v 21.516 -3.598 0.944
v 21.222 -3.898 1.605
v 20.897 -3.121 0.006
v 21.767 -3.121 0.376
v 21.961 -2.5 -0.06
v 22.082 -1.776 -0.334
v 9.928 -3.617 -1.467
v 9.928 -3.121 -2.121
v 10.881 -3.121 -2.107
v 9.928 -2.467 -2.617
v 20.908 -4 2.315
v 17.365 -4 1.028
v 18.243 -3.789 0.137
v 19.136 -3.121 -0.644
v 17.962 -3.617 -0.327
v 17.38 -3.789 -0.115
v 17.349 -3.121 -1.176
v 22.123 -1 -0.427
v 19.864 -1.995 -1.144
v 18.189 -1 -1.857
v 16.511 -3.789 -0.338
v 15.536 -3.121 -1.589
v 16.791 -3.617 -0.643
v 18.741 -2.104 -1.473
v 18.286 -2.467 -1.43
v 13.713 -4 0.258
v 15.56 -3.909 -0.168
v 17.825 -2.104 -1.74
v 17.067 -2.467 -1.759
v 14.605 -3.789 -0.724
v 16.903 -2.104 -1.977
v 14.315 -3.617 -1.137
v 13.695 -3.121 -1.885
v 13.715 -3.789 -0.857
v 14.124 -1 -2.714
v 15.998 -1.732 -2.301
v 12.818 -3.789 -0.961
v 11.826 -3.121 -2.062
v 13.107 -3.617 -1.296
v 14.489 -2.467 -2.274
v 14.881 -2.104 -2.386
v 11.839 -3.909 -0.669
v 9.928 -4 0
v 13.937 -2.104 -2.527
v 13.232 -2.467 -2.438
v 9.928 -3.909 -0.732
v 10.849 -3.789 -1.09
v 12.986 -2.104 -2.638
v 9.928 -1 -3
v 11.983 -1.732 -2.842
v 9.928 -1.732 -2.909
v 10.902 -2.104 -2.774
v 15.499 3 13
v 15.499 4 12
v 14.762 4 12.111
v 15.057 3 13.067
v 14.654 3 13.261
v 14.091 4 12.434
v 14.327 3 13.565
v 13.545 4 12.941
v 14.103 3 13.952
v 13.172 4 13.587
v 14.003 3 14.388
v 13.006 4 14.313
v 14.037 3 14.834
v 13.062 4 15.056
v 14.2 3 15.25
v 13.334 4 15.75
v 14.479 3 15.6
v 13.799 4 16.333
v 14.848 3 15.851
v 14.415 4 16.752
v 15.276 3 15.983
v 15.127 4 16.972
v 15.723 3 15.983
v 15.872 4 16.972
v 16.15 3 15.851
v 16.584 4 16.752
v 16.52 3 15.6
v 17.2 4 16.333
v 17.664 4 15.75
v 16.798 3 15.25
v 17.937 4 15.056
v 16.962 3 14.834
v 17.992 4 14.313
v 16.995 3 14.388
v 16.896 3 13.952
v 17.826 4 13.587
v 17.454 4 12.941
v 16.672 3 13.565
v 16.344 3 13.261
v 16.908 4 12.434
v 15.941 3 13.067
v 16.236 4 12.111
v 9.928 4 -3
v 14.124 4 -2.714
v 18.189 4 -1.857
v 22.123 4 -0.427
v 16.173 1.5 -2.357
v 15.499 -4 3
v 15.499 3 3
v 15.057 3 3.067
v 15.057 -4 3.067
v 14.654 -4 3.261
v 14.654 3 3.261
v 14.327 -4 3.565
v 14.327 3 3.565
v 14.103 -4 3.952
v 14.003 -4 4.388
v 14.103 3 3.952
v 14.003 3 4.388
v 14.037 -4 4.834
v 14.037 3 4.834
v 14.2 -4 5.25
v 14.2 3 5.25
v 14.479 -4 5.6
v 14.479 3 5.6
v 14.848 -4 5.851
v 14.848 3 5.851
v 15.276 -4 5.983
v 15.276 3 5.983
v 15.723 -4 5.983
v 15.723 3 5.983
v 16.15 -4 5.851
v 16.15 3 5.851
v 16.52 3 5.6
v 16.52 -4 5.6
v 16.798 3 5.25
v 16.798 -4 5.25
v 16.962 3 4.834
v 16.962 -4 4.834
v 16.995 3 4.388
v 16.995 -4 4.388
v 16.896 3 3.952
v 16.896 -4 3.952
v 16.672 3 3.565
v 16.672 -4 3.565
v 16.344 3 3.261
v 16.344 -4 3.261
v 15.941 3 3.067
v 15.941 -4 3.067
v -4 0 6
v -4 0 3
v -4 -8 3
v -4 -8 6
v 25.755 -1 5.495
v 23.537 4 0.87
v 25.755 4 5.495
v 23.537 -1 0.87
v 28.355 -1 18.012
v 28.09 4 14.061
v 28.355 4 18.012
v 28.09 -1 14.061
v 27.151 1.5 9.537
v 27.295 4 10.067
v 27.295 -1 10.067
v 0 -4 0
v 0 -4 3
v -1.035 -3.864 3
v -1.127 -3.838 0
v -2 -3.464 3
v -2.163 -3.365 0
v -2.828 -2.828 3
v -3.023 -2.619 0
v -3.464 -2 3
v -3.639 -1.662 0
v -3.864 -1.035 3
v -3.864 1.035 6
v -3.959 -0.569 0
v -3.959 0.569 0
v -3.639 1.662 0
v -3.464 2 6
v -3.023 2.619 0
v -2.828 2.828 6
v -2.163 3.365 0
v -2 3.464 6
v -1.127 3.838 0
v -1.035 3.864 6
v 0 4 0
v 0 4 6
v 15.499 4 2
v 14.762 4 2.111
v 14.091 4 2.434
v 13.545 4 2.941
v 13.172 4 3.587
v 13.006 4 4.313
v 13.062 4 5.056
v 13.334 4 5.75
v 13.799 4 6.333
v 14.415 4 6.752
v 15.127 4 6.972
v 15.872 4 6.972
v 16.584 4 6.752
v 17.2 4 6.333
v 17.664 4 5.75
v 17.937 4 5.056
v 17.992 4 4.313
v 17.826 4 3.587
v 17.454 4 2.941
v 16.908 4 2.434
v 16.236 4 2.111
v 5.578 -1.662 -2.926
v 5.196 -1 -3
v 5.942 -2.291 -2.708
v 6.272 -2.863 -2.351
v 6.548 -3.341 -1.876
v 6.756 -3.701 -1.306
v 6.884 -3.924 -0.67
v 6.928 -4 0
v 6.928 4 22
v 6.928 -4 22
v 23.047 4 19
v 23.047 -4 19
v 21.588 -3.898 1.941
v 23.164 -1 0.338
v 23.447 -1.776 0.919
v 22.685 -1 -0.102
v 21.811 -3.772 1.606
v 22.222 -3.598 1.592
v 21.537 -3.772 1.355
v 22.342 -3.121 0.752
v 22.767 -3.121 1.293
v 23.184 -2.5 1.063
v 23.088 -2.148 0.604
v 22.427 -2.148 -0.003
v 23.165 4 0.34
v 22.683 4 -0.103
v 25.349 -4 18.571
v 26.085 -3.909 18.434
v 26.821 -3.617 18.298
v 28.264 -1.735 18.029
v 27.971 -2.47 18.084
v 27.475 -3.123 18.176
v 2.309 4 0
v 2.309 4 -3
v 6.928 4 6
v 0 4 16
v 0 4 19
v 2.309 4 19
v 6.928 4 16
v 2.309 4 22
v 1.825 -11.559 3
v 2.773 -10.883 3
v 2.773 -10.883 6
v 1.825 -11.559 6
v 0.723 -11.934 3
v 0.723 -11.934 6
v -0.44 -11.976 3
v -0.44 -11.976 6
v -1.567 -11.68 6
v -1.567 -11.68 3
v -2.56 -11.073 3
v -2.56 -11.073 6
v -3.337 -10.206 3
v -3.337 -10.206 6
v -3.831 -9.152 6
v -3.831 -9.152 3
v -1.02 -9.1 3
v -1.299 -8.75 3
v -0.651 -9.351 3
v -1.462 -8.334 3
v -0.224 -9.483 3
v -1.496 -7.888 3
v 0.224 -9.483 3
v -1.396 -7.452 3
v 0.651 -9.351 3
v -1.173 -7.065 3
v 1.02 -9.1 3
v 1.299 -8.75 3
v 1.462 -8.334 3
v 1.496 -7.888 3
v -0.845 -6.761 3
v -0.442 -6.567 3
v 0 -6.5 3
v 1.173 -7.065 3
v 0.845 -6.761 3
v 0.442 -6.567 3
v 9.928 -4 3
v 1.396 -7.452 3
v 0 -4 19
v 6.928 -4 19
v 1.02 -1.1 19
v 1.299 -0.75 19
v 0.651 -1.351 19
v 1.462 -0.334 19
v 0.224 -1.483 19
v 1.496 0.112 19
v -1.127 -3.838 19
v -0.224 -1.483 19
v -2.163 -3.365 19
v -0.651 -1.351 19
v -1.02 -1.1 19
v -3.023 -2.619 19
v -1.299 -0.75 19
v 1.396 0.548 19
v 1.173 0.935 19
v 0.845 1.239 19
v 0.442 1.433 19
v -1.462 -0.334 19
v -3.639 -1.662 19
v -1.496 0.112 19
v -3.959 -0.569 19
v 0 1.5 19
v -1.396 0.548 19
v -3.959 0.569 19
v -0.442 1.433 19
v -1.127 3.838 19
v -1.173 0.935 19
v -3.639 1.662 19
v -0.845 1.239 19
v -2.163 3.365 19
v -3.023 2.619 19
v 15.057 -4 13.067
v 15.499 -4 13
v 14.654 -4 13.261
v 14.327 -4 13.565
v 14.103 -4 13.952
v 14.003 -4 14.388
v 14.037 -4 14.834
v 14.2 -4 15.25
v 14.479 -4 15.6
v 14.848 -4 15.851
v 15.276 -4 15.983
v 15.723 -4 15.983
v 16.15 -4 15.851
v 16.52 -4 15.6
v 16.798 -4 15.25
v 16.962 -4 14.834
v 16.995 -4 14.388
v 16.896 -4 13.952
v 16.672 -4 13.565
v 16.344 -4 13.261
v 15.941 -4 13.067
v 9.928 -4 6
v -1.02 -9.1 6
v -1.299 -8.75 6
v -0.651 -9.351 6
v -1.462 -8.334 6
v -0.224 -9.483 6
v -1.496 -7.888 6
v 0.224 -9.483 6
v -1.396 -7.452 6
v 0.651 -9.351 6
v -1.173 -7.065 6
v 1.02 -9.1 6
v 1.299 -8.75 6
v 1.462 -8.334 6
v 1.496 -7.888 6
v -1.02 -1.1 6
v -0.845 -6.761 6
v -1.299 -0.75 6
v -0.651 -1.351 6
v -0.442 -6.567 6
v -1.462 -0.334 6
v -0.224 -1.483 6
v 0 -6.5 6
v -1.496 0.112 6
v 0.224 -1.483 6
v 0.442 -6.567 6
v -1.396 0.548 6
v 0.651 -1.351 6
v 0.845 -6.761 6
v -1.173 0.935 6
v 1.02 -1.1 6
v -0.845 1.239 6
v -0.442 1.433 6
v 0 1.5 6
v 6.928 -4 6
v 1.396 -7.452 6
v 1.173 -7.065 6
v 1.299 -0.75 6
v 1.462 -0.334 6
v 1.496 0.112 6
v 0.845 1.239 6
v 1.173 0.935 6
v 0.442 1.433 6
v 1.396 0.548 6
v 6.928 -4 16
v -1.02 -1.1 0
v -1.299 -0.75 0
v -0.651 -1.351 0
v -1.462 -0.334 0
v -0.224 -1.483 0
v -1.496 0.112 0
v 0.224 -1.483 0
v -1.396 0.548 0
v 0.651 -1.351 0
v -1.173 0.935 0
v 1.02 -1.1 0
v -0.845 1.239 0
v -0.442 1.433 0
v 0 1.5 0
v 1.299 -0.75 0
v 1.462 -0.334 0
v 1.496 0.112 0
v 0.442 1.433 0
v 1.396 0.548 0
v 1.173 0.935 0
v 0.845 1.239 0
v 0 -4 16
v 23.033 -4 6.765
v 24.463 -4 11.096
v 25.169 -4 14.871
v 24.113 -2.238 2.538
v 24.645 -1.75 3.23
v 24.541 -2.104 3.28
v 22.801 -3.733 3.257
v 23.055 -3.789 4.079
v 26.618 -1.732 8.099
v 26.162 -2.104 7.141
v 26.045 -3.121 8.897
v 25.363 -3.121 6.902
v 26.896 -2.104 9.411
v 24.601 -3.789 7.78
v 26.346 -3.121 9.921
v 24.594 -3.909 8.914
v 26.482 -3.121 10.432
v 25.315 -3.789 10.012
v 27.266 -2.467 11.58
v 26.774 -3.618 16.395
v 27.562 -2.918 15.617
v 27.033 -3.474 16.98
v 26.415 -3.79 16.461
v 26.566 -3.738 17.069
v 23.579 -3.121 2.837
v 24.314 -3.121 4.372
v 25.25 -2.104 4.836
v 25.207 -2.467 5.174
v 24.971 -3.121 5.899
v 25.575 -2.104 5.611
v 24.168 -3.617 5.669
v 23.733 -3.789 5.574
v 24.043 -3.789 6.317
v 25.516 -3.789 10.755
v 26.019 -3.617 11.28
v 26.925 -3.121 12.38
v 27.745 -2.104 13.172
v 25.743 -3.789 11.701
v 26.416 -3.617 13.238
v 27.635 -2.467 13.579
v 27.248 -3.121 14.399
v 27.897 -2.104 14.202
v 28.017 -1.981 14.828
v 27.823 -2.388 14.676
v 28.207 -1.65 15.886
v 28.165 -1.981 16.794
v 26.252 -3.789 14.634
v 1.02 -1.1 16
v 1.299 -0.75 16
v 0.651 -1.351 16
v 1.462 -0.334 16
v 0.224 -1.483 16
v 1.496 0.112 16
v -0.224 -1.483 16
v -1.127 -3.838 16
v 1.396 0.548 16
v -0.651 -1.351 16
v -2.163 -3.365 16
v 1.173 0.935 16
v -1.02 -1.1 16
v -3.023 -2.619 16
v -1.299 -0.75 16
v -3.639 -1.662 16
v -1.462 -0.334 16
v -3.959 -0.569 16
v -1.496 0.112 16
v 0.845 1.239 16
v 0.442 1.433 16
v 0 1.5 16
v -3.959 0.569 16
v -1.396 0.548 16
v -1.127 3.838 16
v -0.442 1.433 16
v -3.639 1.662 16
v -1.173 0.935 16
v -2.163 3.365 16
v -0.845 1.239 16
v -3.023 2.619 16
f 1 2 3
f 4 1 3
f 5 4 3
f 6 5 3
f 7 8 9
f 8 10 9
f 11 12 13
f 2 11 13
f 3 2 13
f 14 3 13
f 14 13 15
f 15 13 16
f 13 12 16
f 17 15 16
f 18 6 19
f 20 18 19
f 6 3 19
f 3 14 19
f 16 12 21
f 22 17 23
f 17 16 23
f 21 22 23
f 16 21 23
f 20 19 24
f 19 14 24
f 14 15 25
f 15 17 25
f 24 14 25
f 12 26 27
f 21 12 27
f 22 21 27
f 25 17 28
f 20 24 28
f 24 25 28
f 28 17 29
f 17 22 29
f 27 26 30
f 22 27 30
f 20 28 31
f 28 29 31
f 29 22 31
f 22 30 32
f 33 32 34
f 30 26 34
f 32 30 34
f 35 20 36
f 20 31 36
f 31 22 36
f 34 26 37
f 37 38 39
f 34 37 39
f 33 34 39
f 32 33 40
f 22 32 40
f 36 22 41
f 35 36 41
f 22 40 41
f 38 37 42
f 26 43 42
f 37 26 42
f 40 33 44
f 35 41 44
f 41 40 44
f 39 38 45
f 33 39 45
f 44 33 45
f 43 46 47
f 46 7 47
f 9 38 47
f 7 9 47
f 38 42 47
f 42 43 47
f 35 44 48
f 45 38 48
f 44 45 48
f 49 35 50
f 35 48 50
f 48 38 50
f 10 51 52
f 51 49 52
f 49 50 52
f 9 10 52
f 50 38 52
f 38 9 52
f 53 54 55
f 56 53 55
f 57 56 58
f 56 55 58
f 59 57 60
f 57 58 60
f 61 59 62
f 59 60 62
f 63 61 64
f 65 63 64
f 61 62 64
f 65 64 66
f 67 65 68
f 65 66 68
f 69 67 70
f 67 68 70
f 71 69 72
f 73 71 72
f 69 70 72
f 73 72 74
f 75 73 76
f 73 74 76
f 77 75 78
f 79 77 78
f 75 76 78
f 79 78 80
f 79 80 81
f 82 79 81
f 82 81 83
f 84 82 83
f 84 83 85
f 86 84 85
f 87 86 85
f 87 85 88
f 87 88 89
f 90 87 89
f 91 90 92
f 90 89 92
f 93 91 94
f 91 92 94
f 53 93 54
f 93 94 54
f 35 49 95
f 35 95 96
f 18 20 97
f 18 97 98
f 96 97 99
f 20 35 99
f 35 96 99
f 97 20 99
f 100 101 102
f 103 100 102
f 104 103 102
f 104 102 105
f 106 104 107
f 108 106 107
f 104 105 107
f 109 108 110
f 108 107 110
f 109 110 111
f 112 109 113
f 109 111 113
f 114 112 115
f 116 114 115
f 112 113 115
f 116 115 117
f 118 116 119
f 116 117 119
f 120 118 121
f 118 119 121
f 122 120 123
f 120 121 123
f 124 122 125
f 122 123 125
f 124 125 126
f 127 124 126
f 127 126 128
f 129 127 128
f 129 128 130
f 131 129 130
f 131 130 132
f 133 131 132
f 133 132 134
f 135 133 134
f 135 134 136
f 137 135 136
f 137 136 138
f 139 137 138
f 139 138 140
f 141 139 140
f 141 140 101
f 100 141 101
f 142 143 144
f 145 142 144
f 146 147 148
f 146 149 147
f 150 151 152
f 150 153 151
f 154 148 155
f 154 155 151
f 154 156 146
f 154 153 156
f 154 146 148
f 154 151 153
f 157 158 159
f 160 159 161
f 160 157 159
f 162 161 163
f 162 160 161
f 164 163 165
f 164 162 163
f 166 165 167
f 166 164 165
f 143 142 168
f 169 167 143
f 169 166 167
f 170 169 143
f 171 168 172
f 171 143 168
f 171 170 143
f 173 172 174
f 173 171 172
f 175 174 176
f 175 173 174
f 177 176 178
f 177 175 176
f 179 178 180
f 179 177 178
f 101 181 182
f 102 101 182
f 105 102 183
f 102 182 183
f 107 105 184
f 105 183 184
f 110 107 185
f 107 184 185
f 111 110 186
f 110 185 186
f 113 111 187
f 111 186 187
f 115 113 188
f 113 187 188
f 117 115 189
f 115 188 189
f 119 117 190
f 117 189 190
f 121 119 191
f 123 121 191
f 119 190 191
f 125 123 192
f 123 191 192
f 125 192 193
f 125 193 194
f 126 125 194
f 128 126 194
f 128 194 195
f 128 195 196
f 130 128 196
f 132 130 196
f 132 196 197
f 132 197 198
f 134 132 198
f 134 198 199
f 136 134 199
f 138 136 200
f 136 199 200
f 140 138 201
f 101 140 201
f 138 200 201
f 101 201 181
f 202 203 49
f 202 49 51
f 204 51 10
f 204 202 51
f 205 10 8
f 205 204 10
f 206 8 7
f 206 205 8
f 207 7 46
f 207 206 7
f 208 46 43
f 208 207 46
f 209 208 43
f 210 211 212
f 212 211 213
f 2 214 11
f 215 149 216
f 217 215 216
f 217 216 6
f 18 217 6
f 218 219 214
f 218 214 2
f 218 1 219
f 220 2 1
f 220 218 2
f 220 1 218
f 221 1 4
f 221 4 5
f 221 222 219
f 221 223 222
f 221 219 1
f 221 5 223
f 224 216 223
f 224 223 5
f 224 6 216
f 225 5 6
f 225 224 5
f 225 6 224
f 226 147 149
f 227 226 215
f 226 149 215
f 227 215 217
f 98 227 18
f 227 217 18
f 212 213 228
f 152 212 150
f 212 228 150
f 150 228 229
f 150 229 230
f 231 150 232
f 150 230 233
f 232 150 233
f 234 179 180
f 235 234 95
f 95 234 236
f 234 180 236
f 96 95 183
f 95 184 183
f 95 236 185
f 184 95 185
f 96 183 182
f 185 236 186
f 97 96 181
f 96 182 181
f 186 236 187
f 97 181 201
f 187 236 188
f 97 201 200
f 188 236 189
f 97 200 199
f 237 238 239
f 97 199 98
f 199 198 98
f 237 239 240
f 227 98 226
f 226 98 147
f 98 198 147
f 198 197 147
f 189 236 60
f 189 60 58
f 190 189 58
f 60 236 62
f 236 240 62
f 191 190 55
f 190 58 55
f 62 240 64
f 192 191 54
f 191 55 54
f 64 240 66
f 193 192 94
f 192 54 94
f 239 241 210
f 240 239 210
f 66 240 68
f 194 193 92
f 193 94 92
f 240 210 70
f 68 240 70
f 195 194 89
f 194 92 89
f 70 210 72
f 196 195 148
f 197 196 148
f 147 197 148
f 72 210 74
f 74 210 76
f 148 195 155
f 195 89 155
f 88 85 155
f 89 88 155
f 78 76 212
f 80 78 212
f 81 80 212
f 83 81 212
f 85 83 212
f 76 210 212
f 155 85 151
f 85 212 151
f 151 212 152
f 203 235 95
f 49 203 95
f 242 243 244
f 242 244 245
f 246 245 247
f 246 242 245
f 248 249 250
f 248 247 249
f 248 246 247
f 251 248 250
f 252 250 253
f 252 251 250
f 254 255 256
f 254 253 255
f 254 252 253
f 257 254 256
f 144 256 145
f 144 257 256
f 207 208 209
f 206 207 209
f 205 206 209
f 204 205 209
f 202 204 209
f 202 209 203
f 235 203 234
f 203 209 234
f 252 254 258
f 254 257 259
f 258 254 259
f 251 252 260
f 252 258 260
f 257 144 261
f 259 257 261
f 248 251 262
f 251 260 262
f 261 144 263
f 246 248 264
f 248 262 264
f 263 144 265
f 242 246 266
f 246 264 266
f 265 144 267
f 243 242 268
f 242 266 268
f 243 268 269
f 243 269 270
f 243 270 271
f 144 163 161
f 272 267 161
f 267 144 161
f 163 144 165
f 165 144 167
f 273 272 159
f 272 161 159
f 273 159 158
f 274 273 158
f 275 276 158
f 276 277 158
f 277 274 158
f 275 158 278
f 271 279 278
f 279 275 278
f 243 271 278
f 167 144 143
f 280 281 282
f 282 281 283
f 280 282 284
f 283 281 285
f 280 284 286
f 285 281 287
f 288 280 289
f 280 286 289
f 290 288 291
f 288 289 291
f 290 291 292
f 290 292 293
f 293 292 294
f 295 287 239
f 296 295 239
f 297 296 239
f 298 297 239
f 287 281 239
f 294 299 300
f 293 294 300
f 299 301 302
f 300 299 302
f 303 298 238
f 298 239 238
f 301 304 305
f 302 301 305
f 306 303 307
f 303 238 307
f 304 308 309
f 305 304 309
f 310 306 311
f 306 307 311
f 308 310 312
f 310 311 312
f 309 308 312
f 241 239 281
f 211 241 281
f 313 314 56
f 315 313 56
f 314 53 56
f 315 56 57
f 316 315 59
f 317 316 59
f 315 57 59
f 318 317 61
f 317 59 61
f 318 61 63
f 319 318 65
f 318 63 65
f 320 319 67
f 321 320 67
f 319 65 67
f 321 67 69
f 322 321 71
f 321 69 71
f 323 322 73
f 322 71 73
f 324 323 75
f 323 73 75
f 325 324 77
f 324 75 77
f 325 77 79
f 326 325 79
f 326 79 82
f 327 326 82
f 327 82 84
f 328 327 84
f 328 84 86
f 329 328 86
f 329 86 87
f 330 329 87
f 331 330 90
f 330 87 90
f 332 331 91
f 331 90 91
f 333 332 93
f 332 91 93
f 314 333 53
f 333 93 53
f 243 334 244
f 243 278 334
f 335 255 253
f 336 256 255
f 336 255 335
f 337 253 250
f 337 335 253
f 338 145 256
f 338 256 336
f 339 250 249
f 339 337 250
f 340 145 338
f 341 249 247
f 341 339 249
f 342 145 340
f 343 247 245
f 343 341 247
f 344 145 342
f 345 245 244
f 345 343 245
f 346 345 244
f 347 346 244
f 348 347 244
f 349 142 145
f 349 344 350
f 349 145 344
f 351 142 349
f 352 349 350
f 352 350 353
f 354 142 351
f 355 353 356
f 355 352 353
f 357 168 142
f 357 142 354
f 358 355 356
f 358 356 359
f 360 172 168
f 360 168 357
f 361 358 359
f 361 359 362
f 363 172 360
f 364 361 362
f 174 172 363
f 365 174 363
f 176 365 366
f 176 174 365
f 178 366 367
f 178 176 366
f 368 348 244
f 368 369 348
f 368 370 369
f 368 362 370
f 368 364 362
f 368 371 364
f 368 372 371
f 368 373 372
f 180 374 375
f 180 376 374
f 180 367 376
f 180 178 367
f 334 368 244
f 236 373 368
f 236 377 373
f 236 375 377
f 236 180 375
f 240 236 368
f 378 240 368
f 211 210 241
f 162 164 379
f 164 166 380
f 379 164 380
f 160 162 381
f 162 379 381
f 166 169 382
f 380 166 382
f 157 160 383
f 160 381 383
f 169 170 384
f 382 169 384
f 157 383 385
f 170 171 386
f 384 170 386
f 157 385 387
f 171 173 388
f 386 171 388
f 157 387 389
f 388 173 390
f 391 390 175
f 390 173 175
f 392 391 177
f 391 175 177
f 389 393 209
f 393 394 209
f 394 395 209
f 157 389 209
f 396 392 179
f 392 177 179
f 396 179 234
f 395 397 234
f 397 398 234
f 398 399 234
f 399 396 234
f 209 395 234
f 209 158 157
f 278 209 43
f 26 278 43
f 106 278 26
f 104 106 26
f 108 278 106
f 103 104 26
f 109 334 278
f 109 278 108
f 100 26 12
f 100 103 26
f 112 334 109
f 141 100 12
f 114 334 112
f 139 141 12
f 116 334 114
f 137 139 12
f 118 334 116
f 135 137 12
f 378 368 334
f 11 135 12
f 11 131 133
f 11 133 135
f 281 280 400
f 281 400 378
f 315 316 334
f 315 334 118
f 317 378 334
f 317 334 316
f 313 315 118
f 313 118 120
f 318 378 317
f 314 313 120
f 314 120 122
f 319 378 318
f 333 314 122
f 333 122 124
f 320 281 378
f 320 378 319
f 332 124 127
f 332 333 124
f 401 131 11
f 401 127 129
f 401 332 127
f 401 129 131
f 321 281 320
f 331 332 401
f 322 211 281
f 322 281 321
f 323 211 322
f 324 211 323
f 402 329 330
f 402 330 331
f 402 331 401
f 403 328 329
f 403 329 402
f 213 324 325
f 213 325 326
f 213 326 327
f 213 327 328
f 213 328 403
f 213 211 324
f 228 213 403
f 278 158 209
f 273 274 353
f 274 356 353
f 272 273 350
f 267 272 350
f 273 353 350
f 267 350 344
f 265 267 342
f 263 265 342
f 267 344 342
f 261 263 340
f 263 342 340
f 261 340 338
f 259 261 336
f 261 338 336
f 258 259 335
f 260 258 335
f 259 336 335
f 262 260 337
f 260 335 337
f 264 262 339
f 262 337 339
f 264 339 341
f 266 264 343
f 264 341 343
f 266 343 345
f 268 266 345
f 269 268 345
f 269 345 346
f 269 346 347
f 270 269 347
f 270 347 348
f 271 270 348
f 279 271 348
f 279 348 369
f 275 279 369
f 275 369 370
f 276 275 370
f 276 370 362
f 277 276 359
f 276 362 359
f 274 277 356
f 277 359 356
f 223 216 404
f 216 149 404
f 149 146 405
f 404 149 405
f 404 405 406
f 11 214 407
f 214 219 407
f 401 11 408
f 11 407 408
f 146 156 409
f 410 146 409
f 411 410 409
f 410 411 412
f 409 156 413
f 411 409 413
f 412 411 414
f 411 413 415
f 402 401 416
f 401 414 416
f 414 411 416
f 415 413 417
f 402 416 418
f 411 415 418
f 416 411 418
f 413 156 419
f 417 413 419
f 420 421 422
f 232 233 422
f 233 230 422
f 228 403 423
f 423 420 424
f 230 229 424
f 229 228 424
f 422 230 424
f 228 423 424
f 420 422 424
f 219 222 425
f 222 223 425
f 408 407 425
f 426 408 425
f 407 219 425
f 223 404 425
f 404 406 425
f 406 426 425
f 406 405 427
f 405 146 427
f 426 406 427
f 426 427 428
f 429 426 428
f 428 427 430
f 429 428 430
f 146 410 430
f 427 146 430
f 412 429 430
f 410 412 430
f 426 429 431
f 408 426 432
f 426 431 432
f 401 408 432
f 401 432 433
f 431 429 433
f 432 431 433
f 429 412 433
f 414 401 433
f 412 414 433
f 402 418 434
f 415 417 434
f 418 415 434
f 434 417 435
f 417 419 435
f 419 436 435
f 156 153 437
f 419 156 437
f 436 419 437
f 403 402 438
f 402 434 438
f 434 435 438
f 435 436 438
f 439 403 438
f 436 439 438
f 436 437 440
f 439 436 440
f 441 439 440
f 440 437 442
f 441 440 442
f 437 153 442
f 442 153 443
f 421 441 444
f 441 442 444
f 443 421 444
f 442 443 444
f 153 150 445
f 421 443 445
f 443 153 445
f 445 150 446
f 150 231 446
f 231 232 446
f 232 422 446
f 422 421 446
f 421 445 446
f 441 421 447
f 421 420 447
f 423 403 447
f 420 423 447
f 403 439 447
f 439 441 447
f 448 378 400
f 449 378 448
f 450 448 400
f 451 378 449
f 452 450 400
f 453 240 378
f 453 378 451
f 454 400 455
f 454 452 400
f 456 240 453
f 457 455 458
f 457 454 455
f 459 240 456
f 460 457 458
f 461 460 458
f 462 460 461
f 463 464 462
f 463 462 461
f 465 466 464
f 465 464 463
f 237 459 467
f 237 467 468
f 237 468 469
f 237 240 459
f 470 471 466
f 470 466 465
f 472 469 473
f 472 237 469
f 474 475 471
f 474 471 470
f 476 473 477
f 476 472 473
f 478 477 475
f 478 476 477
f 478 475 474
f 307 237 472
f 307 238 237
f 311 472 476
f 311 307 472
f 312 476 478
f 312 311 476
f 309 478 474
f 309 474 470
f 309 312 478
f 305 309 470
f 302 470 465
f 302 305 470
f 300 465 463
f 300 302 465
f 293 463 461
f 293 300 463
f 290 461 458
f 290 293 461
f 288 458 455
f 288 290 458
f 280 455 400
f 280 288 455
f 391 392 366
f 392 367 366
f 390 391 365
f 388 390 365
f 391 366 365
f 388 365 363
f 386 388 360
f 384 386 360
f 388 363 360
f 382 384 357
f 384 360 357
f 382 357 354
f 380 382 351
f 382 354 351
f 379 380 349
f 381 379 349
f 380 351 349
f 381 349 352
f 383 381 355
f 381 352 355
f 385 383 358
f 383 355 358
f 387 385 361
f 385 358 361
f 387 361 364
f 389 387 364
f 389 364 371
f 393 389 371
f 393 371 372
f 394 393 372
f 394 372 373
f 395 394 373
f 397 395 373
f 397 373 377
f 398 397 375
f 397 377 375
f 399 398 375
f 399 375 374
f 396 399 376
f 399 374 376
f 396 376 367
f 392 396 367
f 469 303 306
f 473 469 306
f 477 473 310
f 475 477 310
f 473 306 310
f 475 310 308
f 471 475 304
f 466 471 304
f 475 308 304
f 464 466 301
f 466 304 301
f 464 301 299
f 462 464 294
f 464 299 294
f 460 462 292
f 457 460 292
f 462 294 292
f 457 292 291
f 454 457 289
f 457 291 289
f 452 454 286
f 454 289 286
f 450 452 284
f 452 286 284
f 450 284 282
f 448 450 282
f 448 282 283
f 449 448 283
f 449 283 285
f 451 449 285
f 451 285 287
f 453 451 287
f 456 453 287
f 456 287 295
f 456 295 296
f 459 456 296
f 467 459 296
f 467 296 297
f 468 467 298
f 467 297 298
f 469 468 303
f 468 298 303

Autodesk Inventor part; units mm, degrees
ref_plane "YZ Plane" through (0, 0, 0) normal (1, 0, 0) x (0, 1, 0)
ref_plane "XZ Plane" through (0, 0, 0) normal (0, 1, 0) x (-1, 0, 0)
ref_plane "XY Plane" through (0, 0, 0) normal (0, 0, 1) x (1, 0, 0)
sketch "Skizze1" plane through (0, 0, 0) normal (0, 0, 1) x (1, 0, 0)
  circle A0 centre (0, 0) radius 4
  line L0 (2.3094, 4) -> (9.9282, 4)
  line L1 (9.9282, 4) -> (9.9282, -4)
  line L2 (9.9282, -4) -> (6.9282, -4)
  line L3 (6.9282, -4) -> (2.3094, 4)
  line L4 (0, -4) -> (6.9282, -4)
  line L5 (2.3094, 4) -> (0, 4)
  dimension "d0" = 8
  dimension "d2" = 60
  dimension "d10" = 3
extrude "Extrusion1" add sketch "Skizze1" along normal blind 3
extrude "Extrusion2" add sketch "Skizze1" against normal blind 3 contours L3 L0 L1 L2
sketch "Skizze2" plane through (0, 0, 3) normal (0, 0, 1) x (1, 0, 0)
  line L0 (2.3094, 4) -> (9.9282, 4) projected
  line L1 (9.9282, 4) -> (9.9282, -4) projected
  line L2 (9.9282, -4) -> (6.9282, -4) projected
  line L3 (6.9282, -4) -> (2.3094, 4) projected
  line L4 (6.9282, -4) -> (9.9282, -4)
  line L5 (9.9282, -4) -> (9.9282, 4)
  line L6 (9.9282, 4) -> (6.9282, 4)
  line L7 (6.9282, 4) -> (6.9282, -4)
extrude "Extrusion3" add sketch "Skizze2" along normal blind 6.5 contours L0 L1 L2 L7
mirror "Spiegeln1" about plane through (8.4282, 0, 9.5) normal (0, 0, 1)
sketch "Skizze4" plane through (0, 0, 3) normal (0, 0, 1) x (1, 0, 0)
  line L0 (6.9282, -4) -> (6.9282, 4) projected
  line L1 (6.9282, 4) -> (0, 4) projected
  arc A0 (0, 4) -> (0, -4) centre (0, 0) ccw projected
  line L2 (0, -4) -> (6.9282, -4) projected
  line L3 (2.3094, 4) -> (9.9282, 4) projected
  line L4 (9.9282, 4) -> (9.9282, -4) projected
  line L5 (9.9282, -4) -> (6.9282, -4) projected
  line L6 (6.9282, -4) -> (2.3094, 4) projected
  line L7 (-4, 0) -> (-4, -8)
  line L8 (0, 0) -> (0, -8) construction
  line L9 (9.9282, -4) -> (2.773, -10.8828)
  arc A1 (-4, -8) -> (2.773, -10.8828) centre (0, -8) ccw
  arc A2 (0, 4) -> (-4, 0) centre (0, 0) ccw
  line L10 (0, 4) -> (9.9282, 4)
  line L11 (9.9282, -4) -> (9.9282, 4)
  dimension "d18" = 8
extrude "Extrusion4" [suppressed]
extrude "Extrusion5" add sketch "Skizze4" along normal blind 3
sketch "Skizze5" plane through (0, 0, -3) normal (0, 0, -1) x (-1, 0, 0)
  line L0 (-2.3094, 4) -> (-6.9282, -4) projected
  line L1 (0, -4) -> (-6.9282, -4) projected
  arc A0 (0, -4) -> (0, 4) centre (0, 0) ccw projected
  line L2 (-2.3094, 4) -> (0, 4) projected
  line L3 (0, -4) -> (-9.9282, -4) projected
  line L4 (-2.773, -10.8828) -> (-9.9282, -4) projected
  arc A1 (-2.773, -10.8828) -> (4, -8) centre (0, -8) ccw projected
  line L5 (4, 0) -> (4, -8) projected
  arc A2 (0, -4) -> (4, 0) centre (0, 0) ccw projected
hole "Bohrung2" at (0, 0, -3) at (0, -8, -3) direction (0, 0, 1) diameter 3 end through all
sketch "Skizze7" plane through (0, 4, 0) normal (0, 1, 0) x (1, 0, 0)
  line L0 (9.9282, 3) -> (9.9282, -22) projected
  line L1 (2.3094, 3) -> (9.9282, 3) projected
  line L2 (0, 0) -> (0, -6) projected
  line L3 (6.9282, -6) -> (0, -6) projected
  line L4 (9.9282, 3) -> (16.8306, 3) construction
  line L5 (16.8306, 3) -> (23.047, 0) construction
  spline S0 degree 2 poles (9.9282, 3) (16.8306, 3) (23.047, 0) knots 1 1 1 2 2 2
  arc A0 (24.9282, -9.5) -> (23.047, 0) centre (0, -9.5) ccw
  line L6 (9.9282, -9.5) -> (32.3299, -9.5) construction
  line L7 (23.047, 0) -> (2.3094, 0) construction
  line L8 (9.9282, -22) -> (16.8306, -22) construction
  line L9 (16.8306, -22) -> (23.047, -19) construction
  spline S1 degree 2 poles (9.9282, -22) (16.8306, -22) (23.047, -19) knots 1 1 1 2 2 2
  arc A1 (23.047, -19) -> (24.9282, -9.5) centre (0, -9.5) ccw
  dimension "d30" = 15
extrude "Extrusion6" add sketch "Skizze7" against normal up to surface (8 mm away)
sketch "Skizze8" plane through (0, -4, 16) normal (0, -1, 0) x (1, 0, 0)
  arc A0 (19.9211, -13.9956) -> (20.4401, 0.0137) centre (6.9282, -6.5) ccw
  line L0 (9.9282, -13) -> (9.9282, -10)
  line L1 (0, -16) -> (6.9282, -16)
  line L2 (6.9282, -6.5) -> (21.9282, -6.5)
  line L3 (9.9282, -11.5) -> (21.0703, -11.5)
  arc A1 (23.047, -16) -> (23.047, 3) centre (0, -6.5) ccw projected
  line L4 (6.9282, -10) -> (6.9282, 0) projected
  point P0 (15.4993, -1.5)
  point P1 (15.4993, -11.5)
  dimension "d55" = 3
hole "Bohrung3" at (15.4993, -4, 14.5) at (15.4993, -4, 4.5) direction (0, 1, 0) diameter 3 end through all
chamfer "Fase3" distance 1 angle 45 2 edges at (15.4993, 4, 6) (15.4993, 4, 16)
sketch "Skizze12" plane through (0, -4, 0) normal (0, -1, 0) x (1, 0, 0)
  spline S0 degree 2 poles (9.9282, 22) (16.8306, 22) (23.047, 19) knots 0 0 0 1 1 1 projected
  line L0 (9.9282, 22) -> (6.9282, 22) projected
  line L1 (6.9282, 22) -> (23.047, 19)
extrude "Extrusion10" cut sketch "Skizze12" against normal through all
sketch "Skizze13" plane through (0, -4, 0) normal (0, -1, 0) x (1, 0, 0)
  line L0 (23.047, 19) -> (6.9282, 22) projected
  line L1 (6.9282, 6) -> (6.9282, 16) projected
  arc A0 (23.047, 0) -> (23.047, 19) centre (0, 9.5) ccw projected
  line L2 (23.047, 19) -> (28.3554, 18.012)
  line L3 (23.047, 0) -> (28.3554, 9.2178) construction
  line L4 (28.3554, 9.2178) -> (28.3554, 18.012) construction
  spline S0 degree 2 poles (23.047, 0) (28.3554, 9.2178) (28.3554, 18.012) knots 1 1 1 2 2 2
extrude "Extrusion11" add sketch "Skizze13" against normal up to surface (8 mm away)
fillet "Rundung2" radius 3 4 edges at (23.047, 0, 0) (27.0283, -4, 9.1119) (8.4282, -4, -3) (16.6591, -4, -2.25)
equation "\"d0\" = Finger_diameter"
equation "\"d10\" = FingerWall"
equation "\"d4\" = FingerWall"
equation "\"d6\" = FingerWall"
equation "\"d8\" = -1.5 * FingerWall + 0.5 * Finger_width"
equation "\"d18\" = Finger_diameter"
equation "\"d23\" = bearingHole"
equation "\"FingerLaenge_B\" = 25"
equation "\"Hebel_B\" = 25"
equation "\"Finger_width\" = 22"
equation "\"Finger_diameter\" = 8"
equation "\"FingerWall\" = 3"
equation "\"Hebel_basis_2\" = 15"
equation "\"Join_width\" = 3"
equation "\"bearingHole\" = 3"
equation "\"bearingWall\" = 4"
equation "\"support_D\" = 0.25"
properties part number "FingerTipp"
